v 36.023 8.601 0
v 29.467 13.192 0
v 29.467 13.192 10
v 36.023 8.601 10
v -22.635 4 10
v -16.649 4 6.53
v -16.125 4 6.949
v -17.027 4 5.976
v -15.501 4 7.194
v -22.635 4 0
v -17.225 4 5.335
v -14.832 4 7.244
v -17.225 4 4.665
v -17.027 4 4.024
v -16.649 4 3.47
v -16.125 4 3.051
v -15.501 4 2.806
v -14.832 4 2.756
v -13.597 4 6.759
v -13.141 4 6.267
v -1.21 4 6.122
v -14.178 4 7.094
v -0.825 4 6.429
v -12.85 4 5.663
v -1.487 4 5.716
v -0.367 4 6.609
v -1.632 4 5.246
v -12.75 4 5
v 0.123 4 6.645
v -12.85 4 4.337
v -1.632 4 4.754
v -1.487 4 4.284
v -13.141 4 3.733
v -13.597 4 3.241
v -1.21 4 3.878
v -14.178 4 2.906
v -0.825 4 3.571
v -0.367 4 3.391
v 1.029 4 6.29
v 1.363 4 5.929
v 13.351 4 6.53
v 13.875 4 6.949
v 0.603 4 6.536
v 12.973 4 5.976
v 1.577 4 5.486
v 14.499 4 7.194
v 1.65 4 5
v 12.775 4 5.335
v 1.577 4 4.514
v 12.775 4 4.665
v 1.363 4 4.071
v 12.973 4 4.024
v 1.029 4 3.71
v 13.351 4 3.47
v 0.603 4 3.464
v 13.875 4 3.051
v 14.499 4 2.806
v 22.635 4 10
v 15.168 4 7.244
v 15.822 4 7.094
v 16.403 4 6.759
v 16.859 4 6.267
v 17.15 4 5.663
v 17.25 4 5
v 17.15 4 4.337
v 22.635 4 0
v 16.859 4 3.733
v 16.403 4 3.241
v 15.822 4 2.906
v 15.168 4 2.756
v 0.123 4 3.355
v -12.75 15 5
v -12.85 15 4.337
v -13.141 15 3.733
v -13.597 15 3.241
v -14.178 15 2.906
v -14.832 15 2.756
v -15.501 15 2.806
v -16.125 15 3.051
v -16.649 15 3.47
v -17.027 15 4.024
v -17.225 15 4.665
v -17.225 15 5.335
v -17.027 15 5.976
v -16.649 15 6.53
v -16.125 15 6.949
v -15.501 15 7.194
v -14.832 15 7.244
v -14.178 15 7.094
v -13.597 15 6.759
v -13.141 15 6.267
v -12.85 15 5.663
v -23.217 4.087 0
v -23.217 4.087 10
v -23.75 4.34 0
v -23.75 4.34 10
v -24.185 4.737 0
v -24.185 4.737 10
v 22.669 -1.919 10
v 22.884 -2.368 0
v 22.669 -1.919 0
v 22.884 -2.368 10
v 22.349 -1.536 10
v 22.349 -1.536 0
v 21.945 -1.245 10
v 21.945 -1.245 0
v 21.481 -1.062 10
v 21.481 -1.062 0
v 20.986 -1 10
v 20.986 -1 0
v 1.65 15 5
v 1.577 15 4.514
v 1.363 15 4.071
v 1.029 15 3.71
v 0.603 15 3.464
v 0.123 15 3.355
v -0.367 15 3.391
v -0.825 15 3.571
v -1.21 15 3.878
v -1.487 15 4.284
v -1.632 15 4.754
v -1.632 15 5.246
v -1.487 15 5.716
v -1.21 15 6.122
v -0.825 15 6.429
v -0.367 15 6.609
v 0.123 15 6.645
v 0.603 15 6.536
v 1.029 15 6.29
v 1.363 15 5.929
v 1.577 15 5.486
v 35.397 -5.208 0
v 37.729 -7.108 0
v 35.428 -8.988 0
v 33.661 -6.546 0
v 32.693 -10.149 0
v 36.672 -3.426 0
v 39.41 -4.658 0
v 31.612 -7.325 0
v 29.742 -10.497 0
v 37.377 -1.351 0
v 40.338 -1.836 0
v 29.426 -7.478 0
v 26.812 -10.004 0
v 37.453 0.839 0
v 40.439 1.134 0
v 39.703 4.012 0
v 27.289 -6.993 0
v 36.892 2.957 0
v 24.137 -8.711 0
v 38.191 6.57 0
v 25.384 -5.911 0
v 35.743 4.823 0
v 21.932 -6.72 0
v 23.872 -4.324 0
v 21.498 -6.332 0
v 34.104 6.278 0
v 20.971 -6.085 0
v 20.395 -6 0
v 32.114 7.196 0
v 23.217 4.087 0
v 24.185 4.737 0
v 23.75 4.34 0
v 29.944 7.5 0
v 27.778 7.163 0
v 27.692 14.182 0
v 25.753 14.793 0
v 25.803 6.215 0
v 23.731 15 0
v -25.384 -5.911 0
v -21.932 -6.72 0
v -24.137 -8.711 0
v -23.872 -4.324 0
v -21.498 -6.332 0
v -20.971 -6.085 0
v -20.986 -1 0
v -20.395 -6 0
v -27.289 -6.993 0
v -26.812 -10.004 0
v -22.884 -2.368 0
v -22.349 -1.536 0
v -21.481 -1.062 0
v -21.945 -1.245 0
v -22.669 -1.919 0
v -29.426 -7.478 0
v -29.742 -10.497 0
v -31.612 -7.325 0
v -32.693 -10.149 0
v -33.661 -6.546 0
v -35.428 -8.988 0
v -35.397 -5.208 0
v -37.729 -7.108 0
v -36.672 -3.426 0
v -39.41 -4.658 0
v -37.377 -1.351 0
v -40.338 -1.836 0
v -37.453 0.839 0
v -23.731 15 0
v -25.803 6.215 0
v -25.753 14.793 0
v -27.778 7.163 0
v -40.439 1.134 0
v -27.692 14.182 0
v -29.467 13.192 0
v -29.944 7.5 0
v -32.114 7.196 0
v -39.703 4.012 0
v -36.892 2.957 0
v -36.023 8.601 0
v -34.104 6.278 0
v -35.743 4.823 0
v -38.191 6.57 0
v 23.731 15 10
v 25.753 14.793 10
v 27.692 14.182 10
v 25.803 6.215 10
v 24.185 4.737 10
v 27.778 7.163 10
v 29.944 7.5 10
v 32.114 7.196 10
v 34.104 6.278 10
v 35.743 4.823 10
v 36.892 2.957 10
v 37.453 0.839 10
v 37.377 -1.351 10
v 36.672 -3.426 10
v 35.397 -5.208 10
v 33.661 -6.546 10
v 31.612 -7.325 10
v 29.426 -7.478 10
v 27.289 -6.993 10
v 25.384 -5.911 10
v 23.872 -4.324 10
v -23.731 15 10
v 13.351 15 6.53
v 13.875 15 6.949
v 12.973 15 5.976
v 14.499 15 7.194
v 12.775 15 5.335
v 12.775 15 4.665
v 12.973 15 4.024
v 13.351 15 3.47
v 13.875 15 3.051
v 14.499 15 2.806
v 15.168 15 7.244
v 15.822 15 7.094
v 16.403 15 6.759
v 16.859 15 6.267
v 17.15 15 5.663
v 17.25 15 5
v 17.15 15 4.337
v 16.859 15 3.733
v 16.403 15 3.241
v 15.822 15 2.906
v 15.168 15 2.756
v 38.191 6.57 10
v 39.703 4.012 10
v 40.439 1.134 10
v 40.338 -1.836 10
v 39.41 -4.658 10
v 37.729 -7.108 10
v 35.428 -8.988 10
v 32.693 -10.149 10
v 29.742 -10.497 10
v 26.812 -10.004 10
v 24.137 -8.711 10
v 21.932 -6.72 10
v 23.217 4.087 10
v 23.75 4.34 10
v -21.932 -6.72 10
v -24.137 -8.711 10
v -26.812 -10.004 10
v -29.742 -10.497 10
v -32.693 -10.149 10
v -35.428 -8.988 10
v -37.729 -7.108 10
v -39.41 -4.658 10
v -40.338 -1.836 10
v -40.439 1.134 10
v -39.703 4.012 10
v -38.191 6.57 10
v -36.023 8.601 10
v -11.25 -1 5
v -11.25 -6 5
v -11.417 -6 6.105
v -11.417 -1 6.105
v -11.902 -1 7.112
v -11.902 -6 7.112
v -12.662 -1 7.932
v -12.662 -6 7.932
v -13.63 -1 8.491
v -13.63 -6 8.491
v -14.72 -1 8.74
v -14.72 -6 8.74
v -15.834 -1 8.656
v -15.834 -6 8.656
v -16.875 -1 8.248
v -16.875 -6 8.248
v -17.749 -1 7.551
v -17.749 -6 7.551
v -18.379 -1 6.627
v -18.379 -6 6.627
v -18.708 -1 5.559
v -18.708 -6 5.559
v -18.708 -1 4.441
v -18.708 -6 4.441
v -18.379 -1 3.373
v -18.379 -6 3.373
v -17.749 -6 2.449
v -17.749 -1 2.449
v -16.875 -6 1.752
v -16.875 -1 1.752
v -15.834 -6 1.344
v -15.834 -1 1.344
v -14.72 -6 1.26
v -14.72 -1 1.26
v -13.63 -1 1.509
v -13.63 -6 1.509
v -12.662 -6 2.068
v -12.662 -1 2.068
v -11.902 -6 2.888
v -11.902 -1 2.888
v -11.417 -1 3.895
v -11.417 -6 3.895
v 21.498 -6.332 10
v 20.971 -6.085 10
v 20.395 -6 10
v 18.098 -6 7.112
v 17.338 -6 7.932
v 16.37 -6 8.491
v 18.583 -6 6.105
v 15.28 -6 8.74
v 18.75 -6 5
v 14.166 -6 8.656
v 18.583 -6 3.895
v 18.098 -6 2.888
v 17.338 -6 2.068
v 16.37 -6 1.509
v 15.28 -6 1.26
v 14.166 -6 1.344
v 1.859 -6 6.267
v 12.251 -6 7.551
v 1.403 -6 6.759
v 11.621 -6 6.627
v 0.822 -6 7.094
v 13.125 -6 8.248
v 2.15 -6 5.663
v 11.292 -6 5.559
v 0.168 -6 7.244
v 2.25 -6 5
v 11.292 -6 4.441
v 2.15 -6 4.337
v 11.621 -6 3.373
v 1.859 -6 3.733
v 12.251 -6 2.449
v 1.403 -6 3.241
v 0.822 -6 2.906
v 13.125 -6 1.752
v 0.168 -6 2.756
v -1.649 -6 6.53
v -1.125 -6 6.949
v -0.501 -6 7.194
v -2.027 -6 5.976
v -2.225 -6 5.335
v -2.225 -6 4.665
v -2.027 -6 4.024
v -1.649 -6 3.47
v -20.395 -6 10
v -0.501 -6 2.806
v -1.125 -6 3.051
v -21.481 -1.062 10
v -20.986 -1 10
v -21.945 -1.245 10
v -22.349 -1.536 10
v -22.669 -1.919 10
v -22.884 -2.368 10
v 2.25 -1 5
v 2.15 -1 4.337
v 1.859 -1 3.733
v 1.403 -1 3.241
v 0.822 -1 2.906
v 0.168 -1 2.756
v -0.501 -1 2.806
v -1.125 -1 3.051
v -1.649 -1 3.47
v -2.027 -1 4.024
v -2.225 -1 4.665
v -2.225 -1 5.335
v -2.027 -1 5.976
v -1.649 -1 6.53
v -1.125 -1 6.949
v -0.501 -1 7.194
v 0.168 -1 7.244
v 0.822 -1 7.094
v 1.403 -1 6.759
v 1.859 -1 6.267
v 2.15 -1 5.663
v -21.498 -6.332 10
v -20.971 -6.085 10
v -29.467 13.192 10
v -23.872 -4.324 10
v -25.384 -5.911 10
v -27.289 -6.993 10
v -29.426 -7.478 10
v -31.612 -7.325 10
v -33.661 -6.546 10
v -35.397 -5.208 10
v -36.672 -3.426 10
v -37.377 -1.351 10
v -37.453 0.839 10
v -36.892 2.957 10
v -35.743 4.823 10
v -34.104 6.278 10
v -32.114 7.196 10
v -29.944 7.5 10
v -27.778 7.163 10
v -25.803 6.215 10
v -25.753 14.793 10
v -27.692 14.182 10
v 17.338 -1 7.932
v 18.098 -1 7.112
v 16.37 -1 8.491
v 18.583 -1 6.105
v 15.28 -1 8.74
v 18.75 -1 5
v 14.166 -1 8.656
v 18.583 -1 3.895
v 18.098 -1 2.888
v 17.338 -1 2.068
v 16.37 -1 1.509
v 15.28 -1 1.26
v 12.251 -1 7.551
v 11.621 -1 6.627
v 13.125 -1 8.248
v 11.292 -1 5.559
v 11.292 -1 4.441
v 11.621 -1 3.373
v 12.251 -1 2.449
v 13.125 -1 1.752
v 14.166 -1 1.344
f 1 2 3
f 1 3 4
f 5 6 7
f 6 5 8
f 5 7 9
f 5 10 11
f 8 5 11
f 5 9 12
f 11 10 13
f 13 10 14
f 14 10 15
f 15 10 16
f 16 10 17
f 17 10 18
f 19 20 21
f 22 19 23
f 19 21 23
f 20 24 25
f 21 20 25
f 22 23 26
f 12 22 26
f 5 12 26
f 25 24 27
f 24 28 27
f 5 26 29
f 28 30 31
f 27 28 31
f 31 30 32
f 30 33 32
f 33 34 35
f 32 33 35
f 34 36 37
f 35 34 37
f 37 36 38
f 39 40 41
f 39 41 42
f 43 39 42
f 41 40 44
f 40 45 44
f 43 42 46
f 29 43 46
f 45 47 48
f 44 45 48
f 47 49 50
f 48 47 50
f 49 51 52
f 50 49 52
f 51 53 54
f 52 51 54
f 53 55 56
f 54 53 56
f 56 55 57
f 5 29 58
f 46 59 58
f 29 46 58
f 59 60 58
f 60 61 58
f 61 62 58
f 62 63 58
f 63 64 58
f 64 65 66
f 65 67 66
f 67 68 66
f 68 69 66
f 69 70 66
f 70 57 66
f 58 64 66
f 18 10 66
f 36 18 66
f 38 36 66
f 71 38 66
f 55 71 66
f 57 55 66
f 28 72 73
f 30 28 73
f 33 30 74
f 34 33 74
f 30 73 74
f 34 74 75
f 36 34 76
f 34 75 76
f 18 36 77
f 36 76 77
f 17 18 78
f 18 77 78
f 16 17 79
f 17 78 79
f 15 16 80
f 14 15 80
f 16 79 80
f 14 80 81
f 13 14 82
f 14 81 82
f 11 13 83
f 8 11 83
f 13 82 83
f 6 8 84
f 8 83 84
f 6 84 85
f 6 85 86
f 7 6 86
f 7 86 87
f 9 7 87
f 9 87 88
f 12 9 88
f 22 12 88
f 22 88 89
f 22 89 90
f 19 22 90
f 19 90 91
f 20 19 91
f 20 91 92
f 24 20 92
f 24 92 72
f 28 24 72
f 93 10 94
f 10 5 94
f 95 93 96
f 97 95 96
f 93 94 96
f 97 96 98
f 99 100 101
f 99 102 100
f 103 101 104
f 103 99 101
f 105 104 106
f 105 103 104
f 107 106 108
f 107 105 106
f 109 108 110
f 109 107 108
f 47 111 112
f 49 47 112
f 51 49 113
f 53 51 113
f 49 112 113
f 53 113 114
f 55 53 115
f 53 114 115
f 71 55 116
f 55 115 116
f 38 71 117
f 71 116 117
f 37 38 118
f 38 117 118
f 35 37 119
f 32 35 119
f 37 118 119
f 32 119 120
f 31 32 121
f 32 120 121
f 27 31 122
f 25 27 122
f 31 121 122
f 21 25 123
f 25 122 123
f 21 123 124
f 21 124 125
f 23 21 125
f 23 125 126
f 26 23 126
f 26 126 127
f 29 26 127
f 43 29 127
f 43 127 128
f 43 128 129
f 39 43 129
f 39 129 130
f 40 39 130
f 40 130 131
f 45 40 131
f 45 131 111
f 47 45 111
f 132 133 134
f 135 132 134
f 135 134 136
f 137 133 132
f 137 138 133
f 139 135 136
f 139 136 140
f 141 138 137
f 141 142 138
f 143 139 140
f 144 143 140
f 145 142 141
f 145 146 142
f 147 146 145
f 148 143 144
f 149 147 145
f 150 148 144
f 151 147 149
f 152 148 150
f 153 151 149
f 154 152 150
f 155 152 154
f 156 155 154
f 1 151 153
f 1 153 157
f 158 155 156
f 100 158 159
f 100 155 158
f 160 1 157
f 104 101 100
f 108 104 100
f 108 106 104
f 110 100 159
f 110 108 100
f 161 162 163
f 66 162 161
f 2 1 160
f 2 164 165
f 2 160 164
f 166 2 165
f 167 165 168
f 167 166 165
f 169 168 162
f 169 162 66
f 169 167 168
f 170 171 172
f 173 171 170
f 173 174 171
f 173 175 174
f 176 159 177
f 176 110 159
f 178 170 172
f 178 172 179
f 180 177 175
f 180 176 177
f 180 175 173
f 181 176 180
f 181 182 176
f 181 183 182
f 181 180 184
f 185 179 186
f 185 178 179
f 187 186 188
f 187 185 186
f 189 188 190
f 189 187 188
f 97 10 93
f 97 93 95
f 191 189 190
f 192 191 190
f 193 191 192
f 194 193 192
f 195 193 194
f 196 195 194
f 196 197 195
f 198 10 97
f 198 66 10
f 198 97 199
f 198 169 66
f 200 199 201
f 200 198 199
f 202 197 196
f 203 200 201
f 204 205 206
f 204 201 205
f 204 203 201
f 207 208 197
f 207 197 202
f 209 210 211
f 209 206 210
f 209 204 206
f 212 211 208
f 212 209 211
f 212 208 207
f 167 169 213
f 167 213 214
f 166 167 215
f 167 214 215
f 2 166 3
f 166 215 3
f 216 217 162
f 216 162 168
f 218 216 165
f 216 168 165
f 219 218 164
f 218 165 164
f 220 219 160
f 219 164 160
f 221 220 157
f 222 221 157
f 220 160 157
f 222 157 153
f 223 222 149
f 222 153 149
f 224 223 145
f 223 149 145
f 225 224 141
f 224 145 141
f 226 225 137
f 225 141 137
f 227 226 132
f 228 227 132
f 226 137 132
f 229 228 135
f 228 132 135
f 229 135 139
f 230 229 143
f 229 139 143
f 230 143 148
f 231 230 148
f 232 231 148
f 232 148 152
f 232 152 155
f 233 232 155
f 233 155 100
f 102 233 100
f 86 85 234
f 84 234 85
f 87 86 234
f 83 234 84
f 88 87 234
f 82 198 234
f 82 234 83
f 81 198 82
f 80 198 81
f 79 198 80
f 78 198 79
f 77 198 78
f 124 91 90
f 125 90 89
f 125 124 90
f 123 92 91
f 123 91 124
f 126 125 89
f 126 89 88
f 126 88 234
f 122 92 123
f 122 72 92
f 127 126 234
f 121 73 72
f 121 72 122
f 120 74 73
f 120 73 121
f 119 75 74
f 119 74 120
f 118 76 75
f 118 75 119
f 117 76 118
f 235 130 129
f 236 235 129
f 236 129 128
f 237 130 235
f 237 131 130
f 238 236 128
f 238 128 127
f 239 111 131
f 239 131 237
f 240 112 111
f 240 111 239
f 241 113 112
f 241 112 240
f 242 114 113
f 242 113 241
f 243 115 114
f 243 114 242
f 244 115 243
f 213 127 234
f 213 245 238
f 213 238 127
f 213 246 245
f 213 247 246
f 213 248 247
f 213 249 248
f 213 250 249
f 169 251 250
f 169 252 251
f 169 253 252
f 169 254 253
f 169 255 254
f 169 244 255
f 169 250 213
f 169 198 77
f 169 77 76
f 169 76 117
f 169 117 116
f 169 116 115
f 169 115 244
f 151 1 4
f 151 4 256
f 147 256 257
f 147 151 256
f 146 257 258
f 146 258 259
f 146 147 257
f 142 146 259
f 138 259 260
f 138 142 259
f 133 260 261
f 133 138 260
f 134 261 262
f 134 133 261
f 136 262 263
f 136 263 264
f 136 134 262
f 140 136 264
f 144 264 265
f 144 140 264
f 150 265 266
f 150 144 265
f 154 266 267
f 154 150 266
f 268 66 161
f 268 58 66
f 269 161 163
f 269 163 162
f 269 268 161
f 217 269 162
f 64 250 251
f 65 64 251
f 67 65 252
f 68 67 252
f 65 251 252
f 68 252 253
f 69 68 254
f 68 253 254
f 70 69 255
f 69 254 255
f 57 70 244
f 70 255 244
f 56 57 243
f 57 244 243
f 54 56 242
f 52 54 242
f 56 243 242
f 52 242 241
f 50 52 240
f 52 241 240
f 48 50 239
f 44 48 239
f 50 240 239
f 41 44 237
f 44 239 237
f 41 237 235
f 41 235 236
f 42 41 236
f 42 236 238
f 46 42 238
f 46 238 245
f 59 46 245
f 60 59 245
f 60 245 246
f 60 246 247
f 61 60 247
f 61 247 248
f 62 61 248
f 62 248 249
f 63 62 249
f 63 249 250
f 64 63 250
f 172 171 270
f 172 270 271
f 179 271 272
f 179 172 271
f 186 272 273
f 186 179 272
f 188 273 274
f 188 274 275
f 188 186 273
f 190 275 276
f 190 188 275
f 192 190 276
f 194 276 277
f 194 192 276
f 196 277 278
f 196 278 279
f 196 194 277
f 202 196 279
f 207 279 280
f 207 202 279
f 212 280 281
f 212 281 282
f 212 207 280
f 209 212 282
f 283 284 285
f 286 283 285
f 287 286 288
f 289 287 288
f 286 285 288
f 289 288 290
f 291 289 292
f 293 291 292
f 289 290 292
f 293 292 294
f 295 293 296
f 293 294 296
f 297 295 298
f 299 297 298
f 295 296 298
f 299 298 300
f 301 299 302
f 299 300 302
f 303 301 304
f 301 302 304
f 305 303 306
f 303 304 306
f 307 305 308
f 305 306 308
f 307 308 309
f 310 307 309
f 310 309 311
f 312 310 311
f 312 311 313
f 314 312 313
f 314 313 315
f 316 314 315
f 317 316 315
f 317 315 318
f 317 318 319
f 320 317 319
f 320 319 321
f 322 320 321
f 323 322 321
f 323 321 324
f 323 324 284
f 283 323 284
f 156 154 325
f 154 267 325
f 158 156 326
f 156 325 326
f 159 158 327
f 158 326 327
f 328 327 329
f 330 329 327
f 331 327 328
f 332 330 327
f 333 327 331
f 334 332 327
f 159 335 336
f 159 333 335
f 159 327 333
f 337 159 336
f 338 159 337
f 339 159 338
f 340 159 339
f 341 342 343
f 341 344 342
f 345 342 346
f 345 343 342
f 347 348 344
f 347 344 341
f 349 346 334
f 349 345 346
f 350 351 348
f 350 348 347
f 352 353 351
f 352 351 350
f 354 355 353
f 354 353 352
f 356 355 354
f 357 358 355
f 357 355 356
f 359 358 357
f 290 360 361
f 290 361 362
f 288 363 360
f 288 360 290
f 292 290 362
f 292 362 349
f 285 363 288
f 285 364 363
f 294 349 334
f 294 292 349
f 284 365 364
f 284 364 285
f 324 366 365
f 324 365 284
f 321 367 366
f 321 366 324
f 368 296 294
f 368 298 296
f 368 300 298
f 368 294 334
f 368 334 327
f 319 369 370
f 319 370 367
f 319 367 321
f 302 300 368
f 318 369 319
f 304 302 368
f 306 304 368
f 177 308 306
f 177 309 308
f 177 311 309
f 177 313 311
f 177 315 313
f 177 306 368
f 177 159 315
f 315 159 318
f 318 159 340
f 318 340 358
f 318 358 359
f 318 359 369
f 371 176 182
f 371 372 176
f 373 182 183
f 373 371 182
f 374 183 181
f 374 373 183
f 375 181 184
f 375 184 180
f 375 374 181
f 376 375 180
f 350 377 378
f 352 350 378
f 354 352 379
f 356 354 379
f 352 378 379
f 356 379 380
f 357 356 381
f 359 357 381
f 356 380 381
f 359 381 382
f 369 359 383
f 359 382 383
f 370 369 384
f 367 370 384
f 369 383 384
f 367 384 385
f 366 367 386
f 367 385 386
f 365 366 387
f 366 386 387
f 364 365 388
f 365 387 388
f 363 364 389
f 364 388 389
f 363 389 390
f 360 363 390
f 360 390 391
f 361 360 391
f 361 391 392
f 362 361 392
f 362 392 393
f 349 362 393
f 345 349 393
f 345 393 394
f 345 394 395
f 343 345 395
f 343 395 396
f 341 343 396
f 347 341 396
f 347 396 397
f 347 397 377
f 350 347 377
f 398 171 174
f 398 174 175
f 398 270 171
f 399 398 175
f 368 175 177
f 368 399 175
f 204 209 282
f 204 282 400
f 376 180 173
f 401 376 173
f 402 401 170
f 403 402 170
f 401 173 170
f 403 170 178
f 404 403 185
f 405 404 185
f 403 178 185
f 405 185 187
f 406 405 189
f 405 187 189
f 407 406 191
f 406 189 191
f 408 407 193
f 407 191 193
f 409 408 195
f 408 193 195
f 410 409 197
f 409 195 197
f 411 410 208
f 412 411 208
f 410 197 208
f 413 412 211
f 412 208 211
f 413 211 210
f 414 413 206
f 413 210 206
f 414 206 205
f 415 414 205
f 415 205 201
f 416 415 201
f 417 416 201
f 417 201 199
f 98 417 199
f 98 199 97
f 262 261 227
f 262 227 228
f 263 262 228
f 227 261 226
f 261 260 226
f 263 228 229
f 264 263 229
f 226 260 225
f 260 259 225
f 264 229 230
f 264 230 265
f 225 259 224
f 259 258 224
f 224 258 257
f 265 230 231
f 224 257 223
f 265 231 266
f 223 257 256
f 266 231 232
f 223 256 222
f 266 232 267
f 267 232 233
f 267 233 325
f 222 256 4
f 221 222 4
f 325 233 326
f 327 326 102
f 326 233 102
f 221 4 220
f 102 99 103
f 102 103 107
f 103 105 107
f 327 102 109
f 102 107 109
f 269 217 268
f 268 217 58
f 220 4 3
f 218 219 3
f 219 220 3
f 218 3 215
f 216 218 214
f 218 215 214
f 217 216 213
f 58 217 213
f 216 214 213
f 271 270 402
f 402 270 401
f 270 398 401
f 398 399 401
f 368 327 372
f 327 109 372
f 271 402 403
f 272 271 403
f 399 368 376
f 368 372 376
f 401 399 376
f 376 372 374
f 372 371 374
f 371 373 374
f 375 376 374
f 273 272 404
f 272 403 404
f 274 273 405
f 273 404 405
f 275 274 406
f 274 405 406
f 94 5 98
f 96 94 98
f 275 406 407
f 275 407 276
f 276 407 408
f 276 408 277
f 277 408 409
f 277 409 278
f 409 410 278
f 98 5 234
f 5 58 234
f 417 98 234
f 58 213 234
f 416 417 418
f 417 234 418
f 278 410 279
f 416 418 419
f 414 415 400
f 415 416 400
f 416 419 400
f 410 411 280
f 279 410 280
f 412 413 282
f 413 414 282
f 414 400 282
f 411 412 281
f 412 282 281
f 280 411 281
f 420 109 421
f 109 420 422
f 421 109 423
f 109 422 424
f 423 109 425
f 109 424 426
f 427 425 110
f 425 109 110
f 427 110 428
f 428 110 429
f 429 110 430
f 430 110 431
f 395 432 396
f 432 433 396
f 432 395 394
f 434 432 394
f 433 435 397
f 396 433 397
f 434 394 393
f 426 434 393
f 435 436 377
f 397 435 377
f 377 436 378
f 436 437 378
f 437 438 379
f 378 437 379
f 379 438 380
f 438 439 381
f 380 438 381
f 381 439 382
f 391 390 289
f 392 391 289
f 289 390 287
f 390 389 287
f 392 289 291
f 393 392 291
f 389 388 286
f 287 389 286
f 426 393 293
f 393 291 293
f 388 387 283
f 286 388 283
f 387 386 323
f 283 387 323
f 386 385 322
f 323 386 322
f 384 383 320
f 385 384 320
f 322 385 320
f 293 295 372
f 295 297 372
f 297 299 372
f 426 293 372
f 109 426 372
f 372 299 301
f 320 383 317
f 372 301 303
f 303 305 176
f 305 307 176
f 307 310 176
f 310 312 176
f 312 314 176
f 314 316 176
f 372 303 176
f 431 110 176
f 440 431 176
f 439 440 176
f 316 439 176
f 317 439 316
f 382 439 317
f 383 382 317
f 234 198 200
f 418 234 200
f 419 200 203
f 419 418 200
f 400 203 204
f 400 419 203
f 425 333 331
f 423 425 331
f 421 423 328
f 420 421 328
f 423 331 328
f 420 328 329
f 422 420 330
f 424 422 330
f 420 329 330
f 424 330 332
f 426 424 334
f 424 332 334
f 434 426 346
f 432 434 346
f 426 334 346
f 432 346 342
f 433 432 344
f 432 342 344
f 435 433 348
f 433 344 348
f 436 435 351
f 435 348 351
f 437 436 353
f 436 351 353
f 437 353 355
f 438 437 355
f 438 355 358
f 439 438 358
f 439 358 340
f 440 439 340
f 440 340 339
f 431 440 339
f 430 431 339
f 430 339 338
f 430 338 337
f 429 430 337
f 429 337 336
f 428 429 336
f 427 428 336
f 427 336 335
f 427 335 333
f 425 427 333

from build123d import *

# Parameters (mm, degrees)
EXTRUDE_1_DEPTH       = 10
CUT_EXTRUDE_1_REACH   = 23
SKETCH_3_R            = 3.75
HOLE_WIZARD_M41_D     = 4.5
HOLE_WIZARD_M42_D     = 4.5
HOLE_WIZARD_M42_DEPTH = 5
M4X0_71_D             = 3.3
FILLET_1_R            = 10
FILLET_2_R            = 2


with BuildPart() as part:
    # Эскиз1 → Бобышка-Вытянуть1 (new body)
    with BuildSketch(Plane.XY):
        with BuildLine():
            Line((-26.883971253, 15), (26.883971253, 15))
            Line((26.883971253, 15), (36.022552582, 8.601096465))
            ThreePointArc((36.022552582, 8.601096465), (37.414889847, -7.43433982), (21.38315603, -6))
            Line((21.38315603, -6), (-21.38315603, -6))
            ThreePointArc((-21.38315603, -6), (-37.414889847, -7.43433982), (-36.022552582, 8.601096465))
            Line((-36.022552582, 8.601096465), (-26.883971253, 15))
        make_face()
        with BuildLine():
            Line((-23.65571123, 4), (23.65571123, 4))
            ThreePointArc((23.65571123, 4), (37.328277987, -1.595726088), (22.566965626, -1))
            Line((22.566965626, -1), (-22.566965626, -1))
            ThreePointArc((-22.566965626, -1), (-37.328277987, -1.595726088), (-23.65571123, 4))
        make_face(mode=Mode.SUBTRACT)
    extrude(amount=EXTRUDE_1_DEPTH)

    # Эскиз3 → Вырез-Вытянуть1 (cut, up to next)
    with BuildSketch(Plane.XZ.offset(6), mode=Mode.PRIVATE) as cut_extrude_1_sk1:
        with Locations((-15, 5)):
            Circle(SKETCH_3_R)
    cut_extrude_1_tool1 = extrude(cut_extrude_1_sk1.sketch, amount=-CUT_EXTRUDE_1_REACH, mode=Mode.PRIVATE) & part.part
    add(cut_extrude_1_tool1.solids().sort_by_distance((-15, -6, 5))[0], mode=Mode.SUBTRACT)
    # Эскиз3 → Вырез-Вытянуть1 (cut, up to next)
    with BuildSketch(Plane.XZ.offset(6), mode=Mode.PRIVATE) as cut_extrude_1_sk2:
        with Locations((15, 5)):
            Circle(SKETCH_3_R)
    cut_extrude_1_tool2 = extrude(cut_extrude_1_sk2.sketch, amount=-CUT_EXTRUDE_1_REACH, mode=Mode.PRIVATE) & part.part
    add(cut_extrude_1_tool2.solids().sort_by_distance((15, -6, 5))[0], mode=Mode.SUBTRACT)

    # Отверстие с зазором M41 (through all)
    with Locations(Plane(origin=(0, 4, 0), x_dir=(-1, 0, 0), z_dir=(0, -1, 0))):
        with Locations((-15, -5), (15, -5)):
            Hole(HOLE_WIZARD_M41_D / 2)

    # Отверстие с зазором M42
    with Locations(Plane(origin=(0, -6, 0), x_dir=(-1, 0, 0), z_dir=(0, -1, 0))):
        with Locations((0, -5)):
            Hole(HOLE_WIZARD_M42_D / 2, depth=HOLE_WIZARD_M42_DEPTH)

    # Отверстие обработанное метчиком M4x0.71 (through all)
    with Locations(Plane(origin=(0, 4, 0), x_dir=(-1, 0, 0), z_dir=(0, -1, 0))):
        with Locations((0, -5)):
            Hole(M4X0_71_D / 2)

    # Скругление1
    fillet_1_edges = [part.edges().sort_by_distance(p)[0] for p in [
        (-26.883971253, 15, 5),
        (26.883971253, 15, 5),
    ]]
    fillet(fillet_1_edges, radius=FILLET_1_R)

    # Скругление2
    fillet_2_edges = [part.edges().sort_by_distance(p)[0] for p in [
        (21.38315603, -6, 5),
        (-21.38315603, -6, 5),
        (-23.65571123, 4, 5),
        (-22.566965626, -1, 5),
        (22.566965626, -1, 5),
        (23.65571123, 4, 5),
    ]]
    fillet(fillet_2_edges, radius=FILLET_2_R)


solid = part.part
